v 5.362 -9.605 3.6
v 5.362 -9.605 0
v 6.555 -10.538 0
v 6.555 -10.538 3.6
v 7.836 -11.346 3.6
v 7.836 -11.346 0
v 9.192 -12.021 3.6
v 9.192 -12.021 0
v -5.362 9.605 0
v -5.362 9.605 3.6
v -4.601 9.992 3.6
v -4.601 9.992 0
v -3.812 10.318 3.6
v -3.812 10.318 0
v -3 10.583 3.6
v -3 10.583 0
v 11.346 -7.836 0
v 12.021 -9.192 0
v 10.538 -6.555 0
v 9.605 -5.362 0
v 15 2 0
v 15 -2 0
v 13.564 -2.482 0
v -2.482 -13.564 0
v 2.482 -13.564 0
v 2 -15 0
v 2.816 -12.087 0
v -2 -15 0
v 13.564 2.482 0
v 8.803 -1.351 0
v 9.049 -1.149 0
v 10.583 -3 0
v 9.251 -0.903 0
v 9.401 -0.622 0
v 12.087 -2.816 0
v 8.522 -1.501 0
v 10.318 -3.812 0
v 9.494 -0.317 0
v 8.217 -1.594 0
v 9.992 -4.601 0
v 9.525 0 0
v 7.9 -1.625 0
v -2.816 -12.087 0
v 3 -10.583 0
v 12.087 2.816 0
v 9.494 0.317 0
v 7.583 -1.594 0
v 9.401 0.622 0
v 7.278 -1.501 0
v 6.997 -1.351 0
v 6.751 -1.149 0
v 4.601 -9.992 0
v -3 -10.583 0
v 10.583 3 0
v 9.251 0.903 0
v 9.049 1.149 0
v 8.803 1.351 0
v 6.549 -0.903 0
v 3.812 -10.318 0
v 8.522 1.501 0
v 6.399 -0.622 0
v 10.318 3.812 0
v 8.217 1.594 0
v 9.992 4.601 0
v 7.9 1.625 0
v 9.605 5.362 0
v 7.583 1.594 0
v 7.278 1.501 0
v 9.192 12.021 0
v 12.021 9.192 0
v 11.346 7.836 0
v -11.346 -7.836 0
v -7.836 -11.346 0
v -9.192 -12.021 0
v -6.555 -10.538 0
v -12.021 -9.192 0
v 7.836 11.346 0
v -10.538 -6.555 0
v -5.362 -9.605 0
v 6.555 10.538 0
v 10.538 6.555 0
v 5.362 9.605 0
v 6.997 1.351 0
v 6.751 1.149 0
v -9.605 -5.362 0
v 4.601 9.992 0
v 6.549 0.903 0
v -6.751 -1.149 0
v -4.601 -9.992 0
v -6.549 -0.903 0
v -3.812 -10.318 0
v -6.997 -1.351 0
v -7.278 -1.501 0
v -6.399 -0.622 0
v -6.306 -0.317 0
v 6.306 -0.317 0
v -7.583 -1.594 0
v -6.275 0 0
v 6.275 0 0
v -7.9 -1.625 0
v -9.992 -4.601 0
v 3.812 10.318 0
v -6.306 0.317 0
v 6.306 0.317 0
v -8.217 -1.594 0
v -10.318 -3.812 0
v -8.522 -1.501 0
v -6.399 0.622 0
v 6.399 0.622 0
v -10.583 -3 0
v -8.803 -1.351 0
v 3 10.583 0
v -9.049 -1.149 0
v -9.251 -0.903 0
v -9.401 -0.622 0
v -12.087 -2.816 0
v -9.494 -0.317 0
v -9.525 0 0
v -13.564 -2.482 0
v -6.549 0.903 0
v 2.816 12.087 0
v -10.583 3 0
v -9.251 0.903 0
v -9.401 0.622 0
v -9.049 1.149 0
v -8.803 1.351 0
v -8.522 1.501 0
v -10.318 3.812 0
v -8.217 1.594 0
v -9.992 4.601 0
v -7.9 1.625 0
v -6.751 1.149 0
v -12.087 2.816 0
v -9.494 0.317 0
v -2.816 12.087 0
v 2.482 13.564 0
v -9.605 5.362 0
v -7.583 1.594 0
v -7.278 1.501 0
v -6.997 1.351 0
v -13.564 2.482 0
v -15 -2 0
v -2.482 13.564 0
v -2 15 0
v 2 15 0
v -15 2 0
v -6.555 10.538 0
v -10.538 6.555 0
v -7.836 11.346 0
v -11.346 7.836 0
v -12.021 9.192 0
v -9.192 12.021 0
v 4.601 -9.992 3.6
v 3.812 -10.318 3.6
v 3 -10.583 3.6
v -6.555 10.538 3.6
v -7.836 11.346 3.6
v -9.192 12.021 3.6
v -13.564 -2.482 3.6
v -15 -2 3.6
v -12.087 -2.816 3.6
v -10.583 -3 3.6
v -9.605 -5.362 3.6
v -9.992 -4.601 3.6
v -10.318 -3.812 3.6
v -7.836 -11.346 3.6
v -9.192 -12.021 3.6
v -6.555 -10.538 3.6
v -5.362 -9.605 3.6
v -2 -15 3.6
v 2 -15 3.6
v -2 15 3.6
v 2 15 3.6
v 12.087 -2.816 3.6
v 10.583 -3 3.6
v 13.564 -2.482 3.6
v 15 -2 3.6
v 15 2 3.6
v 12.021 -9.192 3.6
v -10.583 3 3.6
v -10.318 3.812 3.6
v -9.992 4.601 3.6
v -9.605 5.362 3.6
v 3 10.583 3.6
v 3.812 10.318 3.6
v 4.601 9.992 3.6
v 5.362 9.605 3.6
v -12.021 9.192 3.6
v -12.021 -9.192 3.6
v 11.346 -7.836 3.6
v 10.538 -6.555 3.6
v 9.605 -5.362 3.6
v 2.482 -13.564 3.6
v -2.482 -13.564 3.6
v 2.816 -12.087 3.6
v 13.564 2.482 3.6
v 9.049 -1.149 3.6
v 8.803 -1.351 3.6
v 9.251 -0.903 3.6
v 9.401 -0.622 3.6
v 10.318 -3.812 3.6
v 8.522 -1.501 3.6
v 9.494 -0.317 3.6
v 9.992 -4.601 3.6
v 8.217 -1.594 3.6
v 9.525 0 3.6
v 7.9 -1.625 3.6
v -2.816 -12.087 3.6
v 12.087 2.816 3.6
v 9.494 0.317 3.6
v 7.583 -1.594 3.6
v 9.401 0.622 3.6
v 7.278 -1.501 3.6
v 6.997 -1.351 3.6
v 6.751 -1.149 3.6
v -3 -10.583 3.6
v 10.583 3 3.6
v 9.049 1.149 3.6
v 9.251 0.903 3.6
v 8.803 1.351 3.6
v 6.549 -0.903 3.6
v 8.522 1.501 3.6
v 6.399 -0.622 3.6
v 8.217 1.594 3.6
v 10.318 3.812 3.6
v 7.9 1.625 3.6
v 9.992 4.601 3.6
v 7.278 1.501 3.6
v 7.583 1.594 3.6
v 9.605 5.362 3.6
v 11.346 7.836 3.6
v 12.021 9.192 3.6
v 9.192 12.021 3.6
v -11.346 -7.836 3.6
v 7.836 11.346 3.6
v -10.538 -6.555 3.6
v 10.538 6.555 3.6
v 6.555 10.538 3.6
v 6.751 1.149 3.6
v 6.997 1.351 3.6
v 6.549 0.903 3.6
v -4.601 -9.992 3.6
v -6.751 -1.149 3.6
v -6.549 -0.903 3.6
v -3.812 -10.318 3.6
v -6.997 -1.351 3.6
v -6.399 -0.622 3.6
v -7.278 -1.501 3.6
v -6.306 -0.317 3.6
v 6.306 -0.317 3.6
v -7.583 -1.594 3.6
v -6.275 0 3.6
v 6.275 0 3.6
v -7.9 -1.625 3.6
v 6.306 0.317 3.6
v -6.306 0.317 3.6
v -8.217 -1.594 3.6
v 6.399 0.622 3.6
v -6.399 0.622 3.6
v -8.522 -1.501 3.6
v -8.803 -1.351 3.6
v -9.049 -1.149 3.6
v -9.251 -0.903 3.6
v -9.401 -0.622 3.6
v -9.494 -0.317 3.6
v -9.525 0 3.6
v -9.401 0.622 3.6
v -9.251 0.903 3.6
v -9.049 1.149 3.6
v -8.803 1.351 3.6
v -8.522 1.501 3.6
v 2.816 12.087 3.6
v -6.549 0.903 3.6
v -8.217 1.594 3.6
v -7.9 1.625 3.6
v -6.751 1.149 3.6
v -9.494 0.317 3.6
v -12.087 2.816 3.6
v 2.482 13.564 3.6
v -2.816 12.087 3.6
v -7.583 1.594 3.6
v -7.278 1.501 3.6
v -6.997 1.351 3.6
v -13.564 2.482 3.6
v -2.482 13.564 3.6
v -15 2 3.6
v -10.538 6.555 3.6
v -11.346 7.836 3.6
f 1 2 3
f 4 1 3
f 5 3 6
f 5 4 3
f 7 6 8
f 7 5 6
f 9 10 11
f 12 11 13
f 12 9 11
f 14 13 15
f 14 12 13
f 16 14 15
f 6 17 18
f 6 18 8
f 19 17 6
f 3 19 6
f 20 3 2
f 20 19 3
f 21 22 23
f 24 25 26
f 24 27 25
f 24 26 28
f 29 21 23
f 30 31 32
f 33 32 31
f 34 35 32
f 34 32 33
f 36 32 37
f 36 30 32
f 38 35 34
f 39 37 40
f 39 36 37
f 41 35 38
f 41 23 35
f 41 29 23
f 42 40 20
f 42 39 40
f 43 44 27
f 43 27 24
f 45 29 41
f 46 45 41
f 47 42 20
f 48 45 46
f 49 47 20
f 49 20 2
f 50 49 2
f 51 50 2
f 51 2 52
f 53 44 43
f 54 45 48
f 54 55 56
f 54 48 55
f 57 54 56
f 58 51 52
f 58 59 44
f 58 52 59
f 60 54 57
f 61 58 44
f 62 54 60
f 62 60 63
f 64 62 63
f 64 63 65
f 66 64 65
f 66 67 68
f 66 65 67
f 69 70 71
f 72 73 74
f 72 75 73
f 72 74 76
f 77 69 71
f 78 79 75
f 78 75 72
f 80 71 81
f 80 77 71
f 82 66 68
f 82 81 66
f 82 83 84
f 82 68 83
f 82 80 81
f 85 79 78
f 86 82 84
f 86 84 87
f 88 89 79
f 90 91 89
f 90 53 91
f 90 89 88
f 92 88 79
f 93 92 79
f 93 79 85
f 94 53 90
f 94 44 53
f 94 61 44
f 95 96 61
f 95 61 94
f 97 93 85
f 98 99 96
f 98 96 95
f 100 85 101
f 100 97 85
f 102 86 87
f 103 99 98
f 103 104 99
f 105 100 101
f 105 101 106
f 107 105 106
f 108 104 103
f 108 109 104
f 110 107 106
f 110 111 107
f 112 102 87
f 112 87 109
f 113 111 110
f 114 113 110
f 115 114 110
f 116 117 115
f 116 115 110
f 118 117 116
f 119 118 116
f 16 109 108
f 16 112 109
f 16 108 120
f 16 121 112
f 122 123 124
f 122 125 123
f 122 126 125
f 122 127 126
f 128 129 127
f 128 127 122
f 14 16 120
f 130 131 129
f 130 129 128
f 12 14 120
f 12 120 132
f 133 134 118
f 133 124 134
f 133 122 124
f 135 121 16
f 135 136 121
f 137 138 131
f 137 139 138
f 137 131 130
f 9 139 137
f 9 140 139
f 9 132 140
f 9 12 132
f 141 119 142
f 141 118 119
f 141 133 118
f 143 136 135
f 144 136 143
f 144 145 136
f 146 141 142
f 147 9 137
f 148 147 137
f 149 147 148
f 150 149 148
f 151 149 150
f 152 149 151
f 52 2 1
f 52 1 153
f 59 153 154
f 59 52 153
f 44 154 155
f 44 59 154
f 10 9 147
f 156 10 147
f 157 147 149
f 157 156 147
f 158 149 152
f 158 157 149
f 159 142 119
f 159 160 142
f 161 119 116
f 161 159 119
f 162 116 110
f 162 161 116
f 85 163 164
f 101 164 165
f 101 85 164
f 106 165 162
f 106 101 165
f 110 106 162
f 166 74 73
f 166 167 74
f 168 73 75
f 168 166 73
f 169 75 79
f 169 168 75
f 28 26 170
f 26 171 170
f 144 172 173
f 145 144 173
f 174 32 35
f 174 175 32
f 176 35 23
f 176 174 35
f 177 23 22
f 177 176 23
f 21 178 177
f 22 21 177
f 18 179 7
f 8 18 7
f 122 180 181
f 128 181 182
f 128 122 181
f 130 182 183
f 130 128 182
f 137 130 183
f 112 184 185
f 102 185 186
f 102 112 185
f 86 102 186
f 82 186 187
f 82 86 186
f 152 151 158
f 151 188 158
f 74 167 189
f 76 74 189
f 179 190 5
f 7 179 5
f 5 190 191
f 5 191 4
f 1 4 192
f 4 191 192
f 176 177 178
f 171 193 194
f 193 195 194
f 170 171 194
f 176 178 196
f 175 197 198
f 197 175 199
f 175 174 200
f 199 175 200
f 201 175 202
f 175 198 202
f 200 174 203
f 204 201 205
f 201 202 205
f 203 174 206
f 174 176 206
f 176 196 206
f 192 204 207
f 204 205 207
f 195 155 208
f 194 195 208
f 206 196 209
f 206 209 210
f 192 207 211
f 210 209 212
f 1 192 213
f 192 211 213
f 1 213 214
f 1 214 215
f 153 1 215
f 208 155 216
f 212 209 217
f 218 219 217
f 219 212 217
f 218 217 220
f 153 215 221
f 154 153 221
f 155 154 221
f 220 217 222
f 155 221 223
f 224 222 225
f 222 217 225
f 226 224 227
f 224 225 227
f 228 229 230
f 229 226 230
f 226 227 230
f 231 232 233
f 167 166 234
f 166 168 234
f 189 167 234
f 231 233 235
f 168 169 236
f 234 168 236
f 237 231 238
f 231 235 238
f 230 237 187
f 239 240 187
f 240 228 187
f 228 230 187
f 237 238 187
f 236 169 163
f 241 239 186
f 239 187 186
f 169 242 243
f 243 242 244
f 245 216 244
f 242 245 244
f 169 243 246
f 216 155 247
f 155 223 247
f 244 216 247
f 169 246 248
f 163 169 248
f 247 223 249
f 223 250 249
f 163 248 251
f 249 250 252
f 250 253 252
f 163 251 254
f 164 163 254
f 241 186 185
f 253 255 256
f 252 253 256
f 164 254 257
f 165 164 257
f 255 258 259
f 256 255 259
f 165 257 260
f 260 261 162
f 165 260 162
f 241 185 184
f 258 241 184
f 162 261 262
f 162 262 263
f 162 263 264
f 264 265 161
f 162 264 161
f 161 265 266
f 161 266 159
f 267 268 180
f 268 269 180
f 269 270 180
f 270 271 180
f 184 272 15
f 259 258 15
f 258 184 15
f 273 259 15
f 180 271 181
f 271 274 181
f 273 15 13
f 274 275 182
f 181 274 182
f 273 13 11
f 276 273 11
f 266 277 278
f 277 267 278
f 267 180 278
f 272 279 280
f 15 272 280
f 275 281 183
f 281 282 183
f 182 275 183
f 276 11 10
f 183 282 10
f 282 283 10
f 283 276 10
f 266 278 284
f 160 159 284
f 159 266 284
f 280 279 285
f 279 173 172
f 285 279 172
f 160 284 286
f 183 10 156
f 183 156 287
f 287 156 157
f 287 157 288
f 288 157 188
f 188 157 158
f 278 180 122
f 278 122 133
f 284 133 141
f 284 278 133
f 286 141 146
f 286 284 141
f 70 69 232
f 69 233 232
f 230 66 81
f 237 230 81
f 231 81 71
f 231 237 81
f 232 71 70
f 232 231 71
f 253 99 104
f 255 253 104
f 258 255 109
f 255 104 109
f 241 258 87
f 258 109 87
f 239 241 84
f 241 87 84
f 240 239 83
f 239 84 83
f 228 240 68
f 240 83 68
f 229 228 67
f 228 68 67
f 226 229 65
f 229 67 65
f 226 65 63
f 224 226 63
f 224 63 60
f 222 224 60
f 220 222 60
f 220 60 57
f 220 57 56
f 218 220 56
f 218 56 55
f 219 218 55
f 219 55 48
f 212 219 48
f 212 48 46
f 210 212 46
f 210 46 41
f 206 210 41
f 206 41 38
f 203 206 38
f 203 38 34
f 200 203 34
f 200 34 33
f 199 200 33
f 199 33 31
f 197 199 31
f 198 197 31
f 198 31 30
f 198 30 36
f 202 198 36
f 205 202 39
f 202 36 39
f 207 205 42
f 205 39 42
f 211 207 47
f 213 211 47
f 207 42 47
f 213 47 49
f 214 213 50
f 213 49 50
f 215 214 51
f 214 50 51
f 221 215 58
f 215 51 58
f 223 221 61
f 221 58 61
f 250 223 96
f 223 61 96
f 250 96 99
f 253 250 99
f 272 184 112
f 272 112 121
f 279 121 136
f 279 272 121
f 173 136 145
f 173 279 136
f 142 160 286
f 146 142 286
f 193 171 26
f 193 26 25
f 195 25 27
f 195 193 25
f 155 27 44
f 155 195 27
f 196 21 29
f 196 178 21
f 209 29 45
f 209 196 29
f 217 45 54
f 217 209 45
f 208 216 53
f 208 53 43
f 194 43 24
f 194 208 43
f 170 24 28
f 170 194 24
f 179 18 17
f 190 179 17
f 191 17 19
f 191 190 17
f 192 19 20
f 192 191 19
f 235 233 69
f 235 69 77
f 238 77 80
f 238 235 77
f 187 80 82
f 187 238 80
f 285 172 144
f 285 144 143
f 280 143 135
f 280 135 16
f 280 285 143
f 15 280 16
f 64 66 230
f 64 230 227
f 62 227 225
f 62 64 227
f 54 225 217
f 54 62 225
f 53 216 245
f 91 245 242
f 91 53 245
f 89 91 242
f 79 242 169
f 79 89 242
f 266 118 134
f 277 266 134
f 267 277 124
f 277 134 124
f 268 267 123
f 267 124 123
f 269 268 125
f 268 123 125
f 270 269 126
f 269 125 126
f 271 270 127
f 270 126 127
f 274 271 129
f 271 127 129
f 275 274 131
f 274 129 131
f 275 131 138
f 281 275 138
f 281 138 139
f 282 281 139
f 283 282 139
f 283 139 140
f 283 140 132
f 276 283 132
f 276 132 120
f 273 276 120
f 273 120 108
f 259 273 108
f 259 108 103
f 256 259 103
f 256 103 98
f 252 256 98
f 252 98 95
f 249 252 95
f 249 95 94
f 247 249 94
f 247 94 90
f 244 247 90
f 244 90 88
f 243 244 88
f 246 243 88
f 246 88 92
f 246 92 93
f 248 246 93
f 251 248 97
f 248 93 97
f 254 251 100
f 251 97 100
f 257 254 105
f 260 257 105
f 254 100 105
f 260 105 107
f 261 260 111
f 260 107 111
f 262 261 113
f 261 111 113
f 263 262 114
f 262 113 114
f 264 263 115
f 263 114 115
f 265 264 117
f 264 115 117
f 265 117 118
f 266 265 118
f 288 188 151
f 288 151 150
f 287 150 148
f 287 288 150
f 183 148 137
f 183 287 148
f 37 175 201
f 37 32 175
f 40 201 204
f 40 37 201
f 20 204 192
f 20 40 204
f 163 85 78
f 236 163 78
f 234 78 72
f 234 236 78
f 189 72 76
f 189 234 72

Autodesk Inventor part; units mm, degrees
ref_plane "YZ Plane" through (0, 0, 0) normal (1, 0, 0) x (0, 1, 0)
ref_plane "XZ Plane" through (0, 0, 0) normal (0, 1, 0) x (-1, 0, 0)
ref_plane "XY Plane" through (0, 0, 0) normal (0, 0, 1) x (1, 0, 0)
ref_plane "Work Plane1" through (0, 0, 0) normal (0, 0, -1) x (-1, 0, 0)
sketch "Sketch3" plane through (0, 0, 0) normal (0, 0, -1) x (-1, 0, 0)
  circle A0 centre (0, 0) radius 11
  line L0 (-15.4, 0) -> (15.4, 0) projected
  dimension "d19" = 22
extrude "Extrusion3" add sketch "Sketch3" against normal blind 3.6
sketch "Sketch4" plane through (0, 0, 3.6) normal (0, 0, 1) x (1, 0, 0)
  arc A0 (10.583, -3) -> (10.583, 3) centre (0, 0) ccw
  line L0 (-16.2075, 0) -> (20.2449, 0) projected
  line L1 (15, 0) -> (15, 2)
  arc A1 (15, 2) -> (10.583, 3) centre (9.5173, -11.9621) ccw
  line L2 (15, 0) -> (15, -2)
  arc A2 (10.583, -3) -> (15, -2) centre (9.5173, 11.9621) ccw
  dimension "d22" = 2
  dimension "d23" = 3
  dimension "d24" = 15
  dimension "d25" = 15
  dimension "d35" = 11
extrude "Extrusion4" add sketch "Sketch4" against normal blind 3.6
sketch "Sketch2" plane through (0, 0, 0) normal (0, 0, -1) x (-1, 0, 0)
  line L0 (-9.8, -2.6) -> (-6, -2.6)
  line L1 (-6, -2.6) -> (-6, 2.6)
  line L2 (-6, 2.6) -> (-9.8, 2.6)
  line L3 (-9.8, 2.6) -> (-9.8, -2.6)
  line L4 (-9.8, -2.6) -> (-6, 2.6) construction
  line L5 (-6, -2.6) -> (-9.8, 2.6) construction
  line L6 (0, -27.5637) -> (0, 32.5752)
  line L7 (9.8, -2.6) -> (6, -2.6)
  line L8 (6, -2.6) -> (6, 2.6)
  line L9 (6, 2.6) -> (9.8, 2.6)
  line L10 (9.8, 2.6) -> (9.8, -2.6)
  line L11 (9.8, -2.6) -> (6, 2.6) construction
  line L12 (6, -2.6) -> (9.8, 2.6) construction
  circle A0 centre (-7.9, 0) radius 1.625
  circle A1 centre (7.9, 0) radius 1.625
  point P0 (0, 0)
  dimension "d31" = 6
  dimension "d32" = 0
  dimension "d33" = 3.25
  dimension "d34" = 3.25
extrude "Extrusion2" cut sketch "Sketch2" against normal blind 3.6 contours A0 | A1
pattern_circular "Circular Pattern1" count 8 over 360 about axis through (0, 0, 0) along (0, 0, 1) of "Extrusion4"
properties part number "tandwiel(ja)"
